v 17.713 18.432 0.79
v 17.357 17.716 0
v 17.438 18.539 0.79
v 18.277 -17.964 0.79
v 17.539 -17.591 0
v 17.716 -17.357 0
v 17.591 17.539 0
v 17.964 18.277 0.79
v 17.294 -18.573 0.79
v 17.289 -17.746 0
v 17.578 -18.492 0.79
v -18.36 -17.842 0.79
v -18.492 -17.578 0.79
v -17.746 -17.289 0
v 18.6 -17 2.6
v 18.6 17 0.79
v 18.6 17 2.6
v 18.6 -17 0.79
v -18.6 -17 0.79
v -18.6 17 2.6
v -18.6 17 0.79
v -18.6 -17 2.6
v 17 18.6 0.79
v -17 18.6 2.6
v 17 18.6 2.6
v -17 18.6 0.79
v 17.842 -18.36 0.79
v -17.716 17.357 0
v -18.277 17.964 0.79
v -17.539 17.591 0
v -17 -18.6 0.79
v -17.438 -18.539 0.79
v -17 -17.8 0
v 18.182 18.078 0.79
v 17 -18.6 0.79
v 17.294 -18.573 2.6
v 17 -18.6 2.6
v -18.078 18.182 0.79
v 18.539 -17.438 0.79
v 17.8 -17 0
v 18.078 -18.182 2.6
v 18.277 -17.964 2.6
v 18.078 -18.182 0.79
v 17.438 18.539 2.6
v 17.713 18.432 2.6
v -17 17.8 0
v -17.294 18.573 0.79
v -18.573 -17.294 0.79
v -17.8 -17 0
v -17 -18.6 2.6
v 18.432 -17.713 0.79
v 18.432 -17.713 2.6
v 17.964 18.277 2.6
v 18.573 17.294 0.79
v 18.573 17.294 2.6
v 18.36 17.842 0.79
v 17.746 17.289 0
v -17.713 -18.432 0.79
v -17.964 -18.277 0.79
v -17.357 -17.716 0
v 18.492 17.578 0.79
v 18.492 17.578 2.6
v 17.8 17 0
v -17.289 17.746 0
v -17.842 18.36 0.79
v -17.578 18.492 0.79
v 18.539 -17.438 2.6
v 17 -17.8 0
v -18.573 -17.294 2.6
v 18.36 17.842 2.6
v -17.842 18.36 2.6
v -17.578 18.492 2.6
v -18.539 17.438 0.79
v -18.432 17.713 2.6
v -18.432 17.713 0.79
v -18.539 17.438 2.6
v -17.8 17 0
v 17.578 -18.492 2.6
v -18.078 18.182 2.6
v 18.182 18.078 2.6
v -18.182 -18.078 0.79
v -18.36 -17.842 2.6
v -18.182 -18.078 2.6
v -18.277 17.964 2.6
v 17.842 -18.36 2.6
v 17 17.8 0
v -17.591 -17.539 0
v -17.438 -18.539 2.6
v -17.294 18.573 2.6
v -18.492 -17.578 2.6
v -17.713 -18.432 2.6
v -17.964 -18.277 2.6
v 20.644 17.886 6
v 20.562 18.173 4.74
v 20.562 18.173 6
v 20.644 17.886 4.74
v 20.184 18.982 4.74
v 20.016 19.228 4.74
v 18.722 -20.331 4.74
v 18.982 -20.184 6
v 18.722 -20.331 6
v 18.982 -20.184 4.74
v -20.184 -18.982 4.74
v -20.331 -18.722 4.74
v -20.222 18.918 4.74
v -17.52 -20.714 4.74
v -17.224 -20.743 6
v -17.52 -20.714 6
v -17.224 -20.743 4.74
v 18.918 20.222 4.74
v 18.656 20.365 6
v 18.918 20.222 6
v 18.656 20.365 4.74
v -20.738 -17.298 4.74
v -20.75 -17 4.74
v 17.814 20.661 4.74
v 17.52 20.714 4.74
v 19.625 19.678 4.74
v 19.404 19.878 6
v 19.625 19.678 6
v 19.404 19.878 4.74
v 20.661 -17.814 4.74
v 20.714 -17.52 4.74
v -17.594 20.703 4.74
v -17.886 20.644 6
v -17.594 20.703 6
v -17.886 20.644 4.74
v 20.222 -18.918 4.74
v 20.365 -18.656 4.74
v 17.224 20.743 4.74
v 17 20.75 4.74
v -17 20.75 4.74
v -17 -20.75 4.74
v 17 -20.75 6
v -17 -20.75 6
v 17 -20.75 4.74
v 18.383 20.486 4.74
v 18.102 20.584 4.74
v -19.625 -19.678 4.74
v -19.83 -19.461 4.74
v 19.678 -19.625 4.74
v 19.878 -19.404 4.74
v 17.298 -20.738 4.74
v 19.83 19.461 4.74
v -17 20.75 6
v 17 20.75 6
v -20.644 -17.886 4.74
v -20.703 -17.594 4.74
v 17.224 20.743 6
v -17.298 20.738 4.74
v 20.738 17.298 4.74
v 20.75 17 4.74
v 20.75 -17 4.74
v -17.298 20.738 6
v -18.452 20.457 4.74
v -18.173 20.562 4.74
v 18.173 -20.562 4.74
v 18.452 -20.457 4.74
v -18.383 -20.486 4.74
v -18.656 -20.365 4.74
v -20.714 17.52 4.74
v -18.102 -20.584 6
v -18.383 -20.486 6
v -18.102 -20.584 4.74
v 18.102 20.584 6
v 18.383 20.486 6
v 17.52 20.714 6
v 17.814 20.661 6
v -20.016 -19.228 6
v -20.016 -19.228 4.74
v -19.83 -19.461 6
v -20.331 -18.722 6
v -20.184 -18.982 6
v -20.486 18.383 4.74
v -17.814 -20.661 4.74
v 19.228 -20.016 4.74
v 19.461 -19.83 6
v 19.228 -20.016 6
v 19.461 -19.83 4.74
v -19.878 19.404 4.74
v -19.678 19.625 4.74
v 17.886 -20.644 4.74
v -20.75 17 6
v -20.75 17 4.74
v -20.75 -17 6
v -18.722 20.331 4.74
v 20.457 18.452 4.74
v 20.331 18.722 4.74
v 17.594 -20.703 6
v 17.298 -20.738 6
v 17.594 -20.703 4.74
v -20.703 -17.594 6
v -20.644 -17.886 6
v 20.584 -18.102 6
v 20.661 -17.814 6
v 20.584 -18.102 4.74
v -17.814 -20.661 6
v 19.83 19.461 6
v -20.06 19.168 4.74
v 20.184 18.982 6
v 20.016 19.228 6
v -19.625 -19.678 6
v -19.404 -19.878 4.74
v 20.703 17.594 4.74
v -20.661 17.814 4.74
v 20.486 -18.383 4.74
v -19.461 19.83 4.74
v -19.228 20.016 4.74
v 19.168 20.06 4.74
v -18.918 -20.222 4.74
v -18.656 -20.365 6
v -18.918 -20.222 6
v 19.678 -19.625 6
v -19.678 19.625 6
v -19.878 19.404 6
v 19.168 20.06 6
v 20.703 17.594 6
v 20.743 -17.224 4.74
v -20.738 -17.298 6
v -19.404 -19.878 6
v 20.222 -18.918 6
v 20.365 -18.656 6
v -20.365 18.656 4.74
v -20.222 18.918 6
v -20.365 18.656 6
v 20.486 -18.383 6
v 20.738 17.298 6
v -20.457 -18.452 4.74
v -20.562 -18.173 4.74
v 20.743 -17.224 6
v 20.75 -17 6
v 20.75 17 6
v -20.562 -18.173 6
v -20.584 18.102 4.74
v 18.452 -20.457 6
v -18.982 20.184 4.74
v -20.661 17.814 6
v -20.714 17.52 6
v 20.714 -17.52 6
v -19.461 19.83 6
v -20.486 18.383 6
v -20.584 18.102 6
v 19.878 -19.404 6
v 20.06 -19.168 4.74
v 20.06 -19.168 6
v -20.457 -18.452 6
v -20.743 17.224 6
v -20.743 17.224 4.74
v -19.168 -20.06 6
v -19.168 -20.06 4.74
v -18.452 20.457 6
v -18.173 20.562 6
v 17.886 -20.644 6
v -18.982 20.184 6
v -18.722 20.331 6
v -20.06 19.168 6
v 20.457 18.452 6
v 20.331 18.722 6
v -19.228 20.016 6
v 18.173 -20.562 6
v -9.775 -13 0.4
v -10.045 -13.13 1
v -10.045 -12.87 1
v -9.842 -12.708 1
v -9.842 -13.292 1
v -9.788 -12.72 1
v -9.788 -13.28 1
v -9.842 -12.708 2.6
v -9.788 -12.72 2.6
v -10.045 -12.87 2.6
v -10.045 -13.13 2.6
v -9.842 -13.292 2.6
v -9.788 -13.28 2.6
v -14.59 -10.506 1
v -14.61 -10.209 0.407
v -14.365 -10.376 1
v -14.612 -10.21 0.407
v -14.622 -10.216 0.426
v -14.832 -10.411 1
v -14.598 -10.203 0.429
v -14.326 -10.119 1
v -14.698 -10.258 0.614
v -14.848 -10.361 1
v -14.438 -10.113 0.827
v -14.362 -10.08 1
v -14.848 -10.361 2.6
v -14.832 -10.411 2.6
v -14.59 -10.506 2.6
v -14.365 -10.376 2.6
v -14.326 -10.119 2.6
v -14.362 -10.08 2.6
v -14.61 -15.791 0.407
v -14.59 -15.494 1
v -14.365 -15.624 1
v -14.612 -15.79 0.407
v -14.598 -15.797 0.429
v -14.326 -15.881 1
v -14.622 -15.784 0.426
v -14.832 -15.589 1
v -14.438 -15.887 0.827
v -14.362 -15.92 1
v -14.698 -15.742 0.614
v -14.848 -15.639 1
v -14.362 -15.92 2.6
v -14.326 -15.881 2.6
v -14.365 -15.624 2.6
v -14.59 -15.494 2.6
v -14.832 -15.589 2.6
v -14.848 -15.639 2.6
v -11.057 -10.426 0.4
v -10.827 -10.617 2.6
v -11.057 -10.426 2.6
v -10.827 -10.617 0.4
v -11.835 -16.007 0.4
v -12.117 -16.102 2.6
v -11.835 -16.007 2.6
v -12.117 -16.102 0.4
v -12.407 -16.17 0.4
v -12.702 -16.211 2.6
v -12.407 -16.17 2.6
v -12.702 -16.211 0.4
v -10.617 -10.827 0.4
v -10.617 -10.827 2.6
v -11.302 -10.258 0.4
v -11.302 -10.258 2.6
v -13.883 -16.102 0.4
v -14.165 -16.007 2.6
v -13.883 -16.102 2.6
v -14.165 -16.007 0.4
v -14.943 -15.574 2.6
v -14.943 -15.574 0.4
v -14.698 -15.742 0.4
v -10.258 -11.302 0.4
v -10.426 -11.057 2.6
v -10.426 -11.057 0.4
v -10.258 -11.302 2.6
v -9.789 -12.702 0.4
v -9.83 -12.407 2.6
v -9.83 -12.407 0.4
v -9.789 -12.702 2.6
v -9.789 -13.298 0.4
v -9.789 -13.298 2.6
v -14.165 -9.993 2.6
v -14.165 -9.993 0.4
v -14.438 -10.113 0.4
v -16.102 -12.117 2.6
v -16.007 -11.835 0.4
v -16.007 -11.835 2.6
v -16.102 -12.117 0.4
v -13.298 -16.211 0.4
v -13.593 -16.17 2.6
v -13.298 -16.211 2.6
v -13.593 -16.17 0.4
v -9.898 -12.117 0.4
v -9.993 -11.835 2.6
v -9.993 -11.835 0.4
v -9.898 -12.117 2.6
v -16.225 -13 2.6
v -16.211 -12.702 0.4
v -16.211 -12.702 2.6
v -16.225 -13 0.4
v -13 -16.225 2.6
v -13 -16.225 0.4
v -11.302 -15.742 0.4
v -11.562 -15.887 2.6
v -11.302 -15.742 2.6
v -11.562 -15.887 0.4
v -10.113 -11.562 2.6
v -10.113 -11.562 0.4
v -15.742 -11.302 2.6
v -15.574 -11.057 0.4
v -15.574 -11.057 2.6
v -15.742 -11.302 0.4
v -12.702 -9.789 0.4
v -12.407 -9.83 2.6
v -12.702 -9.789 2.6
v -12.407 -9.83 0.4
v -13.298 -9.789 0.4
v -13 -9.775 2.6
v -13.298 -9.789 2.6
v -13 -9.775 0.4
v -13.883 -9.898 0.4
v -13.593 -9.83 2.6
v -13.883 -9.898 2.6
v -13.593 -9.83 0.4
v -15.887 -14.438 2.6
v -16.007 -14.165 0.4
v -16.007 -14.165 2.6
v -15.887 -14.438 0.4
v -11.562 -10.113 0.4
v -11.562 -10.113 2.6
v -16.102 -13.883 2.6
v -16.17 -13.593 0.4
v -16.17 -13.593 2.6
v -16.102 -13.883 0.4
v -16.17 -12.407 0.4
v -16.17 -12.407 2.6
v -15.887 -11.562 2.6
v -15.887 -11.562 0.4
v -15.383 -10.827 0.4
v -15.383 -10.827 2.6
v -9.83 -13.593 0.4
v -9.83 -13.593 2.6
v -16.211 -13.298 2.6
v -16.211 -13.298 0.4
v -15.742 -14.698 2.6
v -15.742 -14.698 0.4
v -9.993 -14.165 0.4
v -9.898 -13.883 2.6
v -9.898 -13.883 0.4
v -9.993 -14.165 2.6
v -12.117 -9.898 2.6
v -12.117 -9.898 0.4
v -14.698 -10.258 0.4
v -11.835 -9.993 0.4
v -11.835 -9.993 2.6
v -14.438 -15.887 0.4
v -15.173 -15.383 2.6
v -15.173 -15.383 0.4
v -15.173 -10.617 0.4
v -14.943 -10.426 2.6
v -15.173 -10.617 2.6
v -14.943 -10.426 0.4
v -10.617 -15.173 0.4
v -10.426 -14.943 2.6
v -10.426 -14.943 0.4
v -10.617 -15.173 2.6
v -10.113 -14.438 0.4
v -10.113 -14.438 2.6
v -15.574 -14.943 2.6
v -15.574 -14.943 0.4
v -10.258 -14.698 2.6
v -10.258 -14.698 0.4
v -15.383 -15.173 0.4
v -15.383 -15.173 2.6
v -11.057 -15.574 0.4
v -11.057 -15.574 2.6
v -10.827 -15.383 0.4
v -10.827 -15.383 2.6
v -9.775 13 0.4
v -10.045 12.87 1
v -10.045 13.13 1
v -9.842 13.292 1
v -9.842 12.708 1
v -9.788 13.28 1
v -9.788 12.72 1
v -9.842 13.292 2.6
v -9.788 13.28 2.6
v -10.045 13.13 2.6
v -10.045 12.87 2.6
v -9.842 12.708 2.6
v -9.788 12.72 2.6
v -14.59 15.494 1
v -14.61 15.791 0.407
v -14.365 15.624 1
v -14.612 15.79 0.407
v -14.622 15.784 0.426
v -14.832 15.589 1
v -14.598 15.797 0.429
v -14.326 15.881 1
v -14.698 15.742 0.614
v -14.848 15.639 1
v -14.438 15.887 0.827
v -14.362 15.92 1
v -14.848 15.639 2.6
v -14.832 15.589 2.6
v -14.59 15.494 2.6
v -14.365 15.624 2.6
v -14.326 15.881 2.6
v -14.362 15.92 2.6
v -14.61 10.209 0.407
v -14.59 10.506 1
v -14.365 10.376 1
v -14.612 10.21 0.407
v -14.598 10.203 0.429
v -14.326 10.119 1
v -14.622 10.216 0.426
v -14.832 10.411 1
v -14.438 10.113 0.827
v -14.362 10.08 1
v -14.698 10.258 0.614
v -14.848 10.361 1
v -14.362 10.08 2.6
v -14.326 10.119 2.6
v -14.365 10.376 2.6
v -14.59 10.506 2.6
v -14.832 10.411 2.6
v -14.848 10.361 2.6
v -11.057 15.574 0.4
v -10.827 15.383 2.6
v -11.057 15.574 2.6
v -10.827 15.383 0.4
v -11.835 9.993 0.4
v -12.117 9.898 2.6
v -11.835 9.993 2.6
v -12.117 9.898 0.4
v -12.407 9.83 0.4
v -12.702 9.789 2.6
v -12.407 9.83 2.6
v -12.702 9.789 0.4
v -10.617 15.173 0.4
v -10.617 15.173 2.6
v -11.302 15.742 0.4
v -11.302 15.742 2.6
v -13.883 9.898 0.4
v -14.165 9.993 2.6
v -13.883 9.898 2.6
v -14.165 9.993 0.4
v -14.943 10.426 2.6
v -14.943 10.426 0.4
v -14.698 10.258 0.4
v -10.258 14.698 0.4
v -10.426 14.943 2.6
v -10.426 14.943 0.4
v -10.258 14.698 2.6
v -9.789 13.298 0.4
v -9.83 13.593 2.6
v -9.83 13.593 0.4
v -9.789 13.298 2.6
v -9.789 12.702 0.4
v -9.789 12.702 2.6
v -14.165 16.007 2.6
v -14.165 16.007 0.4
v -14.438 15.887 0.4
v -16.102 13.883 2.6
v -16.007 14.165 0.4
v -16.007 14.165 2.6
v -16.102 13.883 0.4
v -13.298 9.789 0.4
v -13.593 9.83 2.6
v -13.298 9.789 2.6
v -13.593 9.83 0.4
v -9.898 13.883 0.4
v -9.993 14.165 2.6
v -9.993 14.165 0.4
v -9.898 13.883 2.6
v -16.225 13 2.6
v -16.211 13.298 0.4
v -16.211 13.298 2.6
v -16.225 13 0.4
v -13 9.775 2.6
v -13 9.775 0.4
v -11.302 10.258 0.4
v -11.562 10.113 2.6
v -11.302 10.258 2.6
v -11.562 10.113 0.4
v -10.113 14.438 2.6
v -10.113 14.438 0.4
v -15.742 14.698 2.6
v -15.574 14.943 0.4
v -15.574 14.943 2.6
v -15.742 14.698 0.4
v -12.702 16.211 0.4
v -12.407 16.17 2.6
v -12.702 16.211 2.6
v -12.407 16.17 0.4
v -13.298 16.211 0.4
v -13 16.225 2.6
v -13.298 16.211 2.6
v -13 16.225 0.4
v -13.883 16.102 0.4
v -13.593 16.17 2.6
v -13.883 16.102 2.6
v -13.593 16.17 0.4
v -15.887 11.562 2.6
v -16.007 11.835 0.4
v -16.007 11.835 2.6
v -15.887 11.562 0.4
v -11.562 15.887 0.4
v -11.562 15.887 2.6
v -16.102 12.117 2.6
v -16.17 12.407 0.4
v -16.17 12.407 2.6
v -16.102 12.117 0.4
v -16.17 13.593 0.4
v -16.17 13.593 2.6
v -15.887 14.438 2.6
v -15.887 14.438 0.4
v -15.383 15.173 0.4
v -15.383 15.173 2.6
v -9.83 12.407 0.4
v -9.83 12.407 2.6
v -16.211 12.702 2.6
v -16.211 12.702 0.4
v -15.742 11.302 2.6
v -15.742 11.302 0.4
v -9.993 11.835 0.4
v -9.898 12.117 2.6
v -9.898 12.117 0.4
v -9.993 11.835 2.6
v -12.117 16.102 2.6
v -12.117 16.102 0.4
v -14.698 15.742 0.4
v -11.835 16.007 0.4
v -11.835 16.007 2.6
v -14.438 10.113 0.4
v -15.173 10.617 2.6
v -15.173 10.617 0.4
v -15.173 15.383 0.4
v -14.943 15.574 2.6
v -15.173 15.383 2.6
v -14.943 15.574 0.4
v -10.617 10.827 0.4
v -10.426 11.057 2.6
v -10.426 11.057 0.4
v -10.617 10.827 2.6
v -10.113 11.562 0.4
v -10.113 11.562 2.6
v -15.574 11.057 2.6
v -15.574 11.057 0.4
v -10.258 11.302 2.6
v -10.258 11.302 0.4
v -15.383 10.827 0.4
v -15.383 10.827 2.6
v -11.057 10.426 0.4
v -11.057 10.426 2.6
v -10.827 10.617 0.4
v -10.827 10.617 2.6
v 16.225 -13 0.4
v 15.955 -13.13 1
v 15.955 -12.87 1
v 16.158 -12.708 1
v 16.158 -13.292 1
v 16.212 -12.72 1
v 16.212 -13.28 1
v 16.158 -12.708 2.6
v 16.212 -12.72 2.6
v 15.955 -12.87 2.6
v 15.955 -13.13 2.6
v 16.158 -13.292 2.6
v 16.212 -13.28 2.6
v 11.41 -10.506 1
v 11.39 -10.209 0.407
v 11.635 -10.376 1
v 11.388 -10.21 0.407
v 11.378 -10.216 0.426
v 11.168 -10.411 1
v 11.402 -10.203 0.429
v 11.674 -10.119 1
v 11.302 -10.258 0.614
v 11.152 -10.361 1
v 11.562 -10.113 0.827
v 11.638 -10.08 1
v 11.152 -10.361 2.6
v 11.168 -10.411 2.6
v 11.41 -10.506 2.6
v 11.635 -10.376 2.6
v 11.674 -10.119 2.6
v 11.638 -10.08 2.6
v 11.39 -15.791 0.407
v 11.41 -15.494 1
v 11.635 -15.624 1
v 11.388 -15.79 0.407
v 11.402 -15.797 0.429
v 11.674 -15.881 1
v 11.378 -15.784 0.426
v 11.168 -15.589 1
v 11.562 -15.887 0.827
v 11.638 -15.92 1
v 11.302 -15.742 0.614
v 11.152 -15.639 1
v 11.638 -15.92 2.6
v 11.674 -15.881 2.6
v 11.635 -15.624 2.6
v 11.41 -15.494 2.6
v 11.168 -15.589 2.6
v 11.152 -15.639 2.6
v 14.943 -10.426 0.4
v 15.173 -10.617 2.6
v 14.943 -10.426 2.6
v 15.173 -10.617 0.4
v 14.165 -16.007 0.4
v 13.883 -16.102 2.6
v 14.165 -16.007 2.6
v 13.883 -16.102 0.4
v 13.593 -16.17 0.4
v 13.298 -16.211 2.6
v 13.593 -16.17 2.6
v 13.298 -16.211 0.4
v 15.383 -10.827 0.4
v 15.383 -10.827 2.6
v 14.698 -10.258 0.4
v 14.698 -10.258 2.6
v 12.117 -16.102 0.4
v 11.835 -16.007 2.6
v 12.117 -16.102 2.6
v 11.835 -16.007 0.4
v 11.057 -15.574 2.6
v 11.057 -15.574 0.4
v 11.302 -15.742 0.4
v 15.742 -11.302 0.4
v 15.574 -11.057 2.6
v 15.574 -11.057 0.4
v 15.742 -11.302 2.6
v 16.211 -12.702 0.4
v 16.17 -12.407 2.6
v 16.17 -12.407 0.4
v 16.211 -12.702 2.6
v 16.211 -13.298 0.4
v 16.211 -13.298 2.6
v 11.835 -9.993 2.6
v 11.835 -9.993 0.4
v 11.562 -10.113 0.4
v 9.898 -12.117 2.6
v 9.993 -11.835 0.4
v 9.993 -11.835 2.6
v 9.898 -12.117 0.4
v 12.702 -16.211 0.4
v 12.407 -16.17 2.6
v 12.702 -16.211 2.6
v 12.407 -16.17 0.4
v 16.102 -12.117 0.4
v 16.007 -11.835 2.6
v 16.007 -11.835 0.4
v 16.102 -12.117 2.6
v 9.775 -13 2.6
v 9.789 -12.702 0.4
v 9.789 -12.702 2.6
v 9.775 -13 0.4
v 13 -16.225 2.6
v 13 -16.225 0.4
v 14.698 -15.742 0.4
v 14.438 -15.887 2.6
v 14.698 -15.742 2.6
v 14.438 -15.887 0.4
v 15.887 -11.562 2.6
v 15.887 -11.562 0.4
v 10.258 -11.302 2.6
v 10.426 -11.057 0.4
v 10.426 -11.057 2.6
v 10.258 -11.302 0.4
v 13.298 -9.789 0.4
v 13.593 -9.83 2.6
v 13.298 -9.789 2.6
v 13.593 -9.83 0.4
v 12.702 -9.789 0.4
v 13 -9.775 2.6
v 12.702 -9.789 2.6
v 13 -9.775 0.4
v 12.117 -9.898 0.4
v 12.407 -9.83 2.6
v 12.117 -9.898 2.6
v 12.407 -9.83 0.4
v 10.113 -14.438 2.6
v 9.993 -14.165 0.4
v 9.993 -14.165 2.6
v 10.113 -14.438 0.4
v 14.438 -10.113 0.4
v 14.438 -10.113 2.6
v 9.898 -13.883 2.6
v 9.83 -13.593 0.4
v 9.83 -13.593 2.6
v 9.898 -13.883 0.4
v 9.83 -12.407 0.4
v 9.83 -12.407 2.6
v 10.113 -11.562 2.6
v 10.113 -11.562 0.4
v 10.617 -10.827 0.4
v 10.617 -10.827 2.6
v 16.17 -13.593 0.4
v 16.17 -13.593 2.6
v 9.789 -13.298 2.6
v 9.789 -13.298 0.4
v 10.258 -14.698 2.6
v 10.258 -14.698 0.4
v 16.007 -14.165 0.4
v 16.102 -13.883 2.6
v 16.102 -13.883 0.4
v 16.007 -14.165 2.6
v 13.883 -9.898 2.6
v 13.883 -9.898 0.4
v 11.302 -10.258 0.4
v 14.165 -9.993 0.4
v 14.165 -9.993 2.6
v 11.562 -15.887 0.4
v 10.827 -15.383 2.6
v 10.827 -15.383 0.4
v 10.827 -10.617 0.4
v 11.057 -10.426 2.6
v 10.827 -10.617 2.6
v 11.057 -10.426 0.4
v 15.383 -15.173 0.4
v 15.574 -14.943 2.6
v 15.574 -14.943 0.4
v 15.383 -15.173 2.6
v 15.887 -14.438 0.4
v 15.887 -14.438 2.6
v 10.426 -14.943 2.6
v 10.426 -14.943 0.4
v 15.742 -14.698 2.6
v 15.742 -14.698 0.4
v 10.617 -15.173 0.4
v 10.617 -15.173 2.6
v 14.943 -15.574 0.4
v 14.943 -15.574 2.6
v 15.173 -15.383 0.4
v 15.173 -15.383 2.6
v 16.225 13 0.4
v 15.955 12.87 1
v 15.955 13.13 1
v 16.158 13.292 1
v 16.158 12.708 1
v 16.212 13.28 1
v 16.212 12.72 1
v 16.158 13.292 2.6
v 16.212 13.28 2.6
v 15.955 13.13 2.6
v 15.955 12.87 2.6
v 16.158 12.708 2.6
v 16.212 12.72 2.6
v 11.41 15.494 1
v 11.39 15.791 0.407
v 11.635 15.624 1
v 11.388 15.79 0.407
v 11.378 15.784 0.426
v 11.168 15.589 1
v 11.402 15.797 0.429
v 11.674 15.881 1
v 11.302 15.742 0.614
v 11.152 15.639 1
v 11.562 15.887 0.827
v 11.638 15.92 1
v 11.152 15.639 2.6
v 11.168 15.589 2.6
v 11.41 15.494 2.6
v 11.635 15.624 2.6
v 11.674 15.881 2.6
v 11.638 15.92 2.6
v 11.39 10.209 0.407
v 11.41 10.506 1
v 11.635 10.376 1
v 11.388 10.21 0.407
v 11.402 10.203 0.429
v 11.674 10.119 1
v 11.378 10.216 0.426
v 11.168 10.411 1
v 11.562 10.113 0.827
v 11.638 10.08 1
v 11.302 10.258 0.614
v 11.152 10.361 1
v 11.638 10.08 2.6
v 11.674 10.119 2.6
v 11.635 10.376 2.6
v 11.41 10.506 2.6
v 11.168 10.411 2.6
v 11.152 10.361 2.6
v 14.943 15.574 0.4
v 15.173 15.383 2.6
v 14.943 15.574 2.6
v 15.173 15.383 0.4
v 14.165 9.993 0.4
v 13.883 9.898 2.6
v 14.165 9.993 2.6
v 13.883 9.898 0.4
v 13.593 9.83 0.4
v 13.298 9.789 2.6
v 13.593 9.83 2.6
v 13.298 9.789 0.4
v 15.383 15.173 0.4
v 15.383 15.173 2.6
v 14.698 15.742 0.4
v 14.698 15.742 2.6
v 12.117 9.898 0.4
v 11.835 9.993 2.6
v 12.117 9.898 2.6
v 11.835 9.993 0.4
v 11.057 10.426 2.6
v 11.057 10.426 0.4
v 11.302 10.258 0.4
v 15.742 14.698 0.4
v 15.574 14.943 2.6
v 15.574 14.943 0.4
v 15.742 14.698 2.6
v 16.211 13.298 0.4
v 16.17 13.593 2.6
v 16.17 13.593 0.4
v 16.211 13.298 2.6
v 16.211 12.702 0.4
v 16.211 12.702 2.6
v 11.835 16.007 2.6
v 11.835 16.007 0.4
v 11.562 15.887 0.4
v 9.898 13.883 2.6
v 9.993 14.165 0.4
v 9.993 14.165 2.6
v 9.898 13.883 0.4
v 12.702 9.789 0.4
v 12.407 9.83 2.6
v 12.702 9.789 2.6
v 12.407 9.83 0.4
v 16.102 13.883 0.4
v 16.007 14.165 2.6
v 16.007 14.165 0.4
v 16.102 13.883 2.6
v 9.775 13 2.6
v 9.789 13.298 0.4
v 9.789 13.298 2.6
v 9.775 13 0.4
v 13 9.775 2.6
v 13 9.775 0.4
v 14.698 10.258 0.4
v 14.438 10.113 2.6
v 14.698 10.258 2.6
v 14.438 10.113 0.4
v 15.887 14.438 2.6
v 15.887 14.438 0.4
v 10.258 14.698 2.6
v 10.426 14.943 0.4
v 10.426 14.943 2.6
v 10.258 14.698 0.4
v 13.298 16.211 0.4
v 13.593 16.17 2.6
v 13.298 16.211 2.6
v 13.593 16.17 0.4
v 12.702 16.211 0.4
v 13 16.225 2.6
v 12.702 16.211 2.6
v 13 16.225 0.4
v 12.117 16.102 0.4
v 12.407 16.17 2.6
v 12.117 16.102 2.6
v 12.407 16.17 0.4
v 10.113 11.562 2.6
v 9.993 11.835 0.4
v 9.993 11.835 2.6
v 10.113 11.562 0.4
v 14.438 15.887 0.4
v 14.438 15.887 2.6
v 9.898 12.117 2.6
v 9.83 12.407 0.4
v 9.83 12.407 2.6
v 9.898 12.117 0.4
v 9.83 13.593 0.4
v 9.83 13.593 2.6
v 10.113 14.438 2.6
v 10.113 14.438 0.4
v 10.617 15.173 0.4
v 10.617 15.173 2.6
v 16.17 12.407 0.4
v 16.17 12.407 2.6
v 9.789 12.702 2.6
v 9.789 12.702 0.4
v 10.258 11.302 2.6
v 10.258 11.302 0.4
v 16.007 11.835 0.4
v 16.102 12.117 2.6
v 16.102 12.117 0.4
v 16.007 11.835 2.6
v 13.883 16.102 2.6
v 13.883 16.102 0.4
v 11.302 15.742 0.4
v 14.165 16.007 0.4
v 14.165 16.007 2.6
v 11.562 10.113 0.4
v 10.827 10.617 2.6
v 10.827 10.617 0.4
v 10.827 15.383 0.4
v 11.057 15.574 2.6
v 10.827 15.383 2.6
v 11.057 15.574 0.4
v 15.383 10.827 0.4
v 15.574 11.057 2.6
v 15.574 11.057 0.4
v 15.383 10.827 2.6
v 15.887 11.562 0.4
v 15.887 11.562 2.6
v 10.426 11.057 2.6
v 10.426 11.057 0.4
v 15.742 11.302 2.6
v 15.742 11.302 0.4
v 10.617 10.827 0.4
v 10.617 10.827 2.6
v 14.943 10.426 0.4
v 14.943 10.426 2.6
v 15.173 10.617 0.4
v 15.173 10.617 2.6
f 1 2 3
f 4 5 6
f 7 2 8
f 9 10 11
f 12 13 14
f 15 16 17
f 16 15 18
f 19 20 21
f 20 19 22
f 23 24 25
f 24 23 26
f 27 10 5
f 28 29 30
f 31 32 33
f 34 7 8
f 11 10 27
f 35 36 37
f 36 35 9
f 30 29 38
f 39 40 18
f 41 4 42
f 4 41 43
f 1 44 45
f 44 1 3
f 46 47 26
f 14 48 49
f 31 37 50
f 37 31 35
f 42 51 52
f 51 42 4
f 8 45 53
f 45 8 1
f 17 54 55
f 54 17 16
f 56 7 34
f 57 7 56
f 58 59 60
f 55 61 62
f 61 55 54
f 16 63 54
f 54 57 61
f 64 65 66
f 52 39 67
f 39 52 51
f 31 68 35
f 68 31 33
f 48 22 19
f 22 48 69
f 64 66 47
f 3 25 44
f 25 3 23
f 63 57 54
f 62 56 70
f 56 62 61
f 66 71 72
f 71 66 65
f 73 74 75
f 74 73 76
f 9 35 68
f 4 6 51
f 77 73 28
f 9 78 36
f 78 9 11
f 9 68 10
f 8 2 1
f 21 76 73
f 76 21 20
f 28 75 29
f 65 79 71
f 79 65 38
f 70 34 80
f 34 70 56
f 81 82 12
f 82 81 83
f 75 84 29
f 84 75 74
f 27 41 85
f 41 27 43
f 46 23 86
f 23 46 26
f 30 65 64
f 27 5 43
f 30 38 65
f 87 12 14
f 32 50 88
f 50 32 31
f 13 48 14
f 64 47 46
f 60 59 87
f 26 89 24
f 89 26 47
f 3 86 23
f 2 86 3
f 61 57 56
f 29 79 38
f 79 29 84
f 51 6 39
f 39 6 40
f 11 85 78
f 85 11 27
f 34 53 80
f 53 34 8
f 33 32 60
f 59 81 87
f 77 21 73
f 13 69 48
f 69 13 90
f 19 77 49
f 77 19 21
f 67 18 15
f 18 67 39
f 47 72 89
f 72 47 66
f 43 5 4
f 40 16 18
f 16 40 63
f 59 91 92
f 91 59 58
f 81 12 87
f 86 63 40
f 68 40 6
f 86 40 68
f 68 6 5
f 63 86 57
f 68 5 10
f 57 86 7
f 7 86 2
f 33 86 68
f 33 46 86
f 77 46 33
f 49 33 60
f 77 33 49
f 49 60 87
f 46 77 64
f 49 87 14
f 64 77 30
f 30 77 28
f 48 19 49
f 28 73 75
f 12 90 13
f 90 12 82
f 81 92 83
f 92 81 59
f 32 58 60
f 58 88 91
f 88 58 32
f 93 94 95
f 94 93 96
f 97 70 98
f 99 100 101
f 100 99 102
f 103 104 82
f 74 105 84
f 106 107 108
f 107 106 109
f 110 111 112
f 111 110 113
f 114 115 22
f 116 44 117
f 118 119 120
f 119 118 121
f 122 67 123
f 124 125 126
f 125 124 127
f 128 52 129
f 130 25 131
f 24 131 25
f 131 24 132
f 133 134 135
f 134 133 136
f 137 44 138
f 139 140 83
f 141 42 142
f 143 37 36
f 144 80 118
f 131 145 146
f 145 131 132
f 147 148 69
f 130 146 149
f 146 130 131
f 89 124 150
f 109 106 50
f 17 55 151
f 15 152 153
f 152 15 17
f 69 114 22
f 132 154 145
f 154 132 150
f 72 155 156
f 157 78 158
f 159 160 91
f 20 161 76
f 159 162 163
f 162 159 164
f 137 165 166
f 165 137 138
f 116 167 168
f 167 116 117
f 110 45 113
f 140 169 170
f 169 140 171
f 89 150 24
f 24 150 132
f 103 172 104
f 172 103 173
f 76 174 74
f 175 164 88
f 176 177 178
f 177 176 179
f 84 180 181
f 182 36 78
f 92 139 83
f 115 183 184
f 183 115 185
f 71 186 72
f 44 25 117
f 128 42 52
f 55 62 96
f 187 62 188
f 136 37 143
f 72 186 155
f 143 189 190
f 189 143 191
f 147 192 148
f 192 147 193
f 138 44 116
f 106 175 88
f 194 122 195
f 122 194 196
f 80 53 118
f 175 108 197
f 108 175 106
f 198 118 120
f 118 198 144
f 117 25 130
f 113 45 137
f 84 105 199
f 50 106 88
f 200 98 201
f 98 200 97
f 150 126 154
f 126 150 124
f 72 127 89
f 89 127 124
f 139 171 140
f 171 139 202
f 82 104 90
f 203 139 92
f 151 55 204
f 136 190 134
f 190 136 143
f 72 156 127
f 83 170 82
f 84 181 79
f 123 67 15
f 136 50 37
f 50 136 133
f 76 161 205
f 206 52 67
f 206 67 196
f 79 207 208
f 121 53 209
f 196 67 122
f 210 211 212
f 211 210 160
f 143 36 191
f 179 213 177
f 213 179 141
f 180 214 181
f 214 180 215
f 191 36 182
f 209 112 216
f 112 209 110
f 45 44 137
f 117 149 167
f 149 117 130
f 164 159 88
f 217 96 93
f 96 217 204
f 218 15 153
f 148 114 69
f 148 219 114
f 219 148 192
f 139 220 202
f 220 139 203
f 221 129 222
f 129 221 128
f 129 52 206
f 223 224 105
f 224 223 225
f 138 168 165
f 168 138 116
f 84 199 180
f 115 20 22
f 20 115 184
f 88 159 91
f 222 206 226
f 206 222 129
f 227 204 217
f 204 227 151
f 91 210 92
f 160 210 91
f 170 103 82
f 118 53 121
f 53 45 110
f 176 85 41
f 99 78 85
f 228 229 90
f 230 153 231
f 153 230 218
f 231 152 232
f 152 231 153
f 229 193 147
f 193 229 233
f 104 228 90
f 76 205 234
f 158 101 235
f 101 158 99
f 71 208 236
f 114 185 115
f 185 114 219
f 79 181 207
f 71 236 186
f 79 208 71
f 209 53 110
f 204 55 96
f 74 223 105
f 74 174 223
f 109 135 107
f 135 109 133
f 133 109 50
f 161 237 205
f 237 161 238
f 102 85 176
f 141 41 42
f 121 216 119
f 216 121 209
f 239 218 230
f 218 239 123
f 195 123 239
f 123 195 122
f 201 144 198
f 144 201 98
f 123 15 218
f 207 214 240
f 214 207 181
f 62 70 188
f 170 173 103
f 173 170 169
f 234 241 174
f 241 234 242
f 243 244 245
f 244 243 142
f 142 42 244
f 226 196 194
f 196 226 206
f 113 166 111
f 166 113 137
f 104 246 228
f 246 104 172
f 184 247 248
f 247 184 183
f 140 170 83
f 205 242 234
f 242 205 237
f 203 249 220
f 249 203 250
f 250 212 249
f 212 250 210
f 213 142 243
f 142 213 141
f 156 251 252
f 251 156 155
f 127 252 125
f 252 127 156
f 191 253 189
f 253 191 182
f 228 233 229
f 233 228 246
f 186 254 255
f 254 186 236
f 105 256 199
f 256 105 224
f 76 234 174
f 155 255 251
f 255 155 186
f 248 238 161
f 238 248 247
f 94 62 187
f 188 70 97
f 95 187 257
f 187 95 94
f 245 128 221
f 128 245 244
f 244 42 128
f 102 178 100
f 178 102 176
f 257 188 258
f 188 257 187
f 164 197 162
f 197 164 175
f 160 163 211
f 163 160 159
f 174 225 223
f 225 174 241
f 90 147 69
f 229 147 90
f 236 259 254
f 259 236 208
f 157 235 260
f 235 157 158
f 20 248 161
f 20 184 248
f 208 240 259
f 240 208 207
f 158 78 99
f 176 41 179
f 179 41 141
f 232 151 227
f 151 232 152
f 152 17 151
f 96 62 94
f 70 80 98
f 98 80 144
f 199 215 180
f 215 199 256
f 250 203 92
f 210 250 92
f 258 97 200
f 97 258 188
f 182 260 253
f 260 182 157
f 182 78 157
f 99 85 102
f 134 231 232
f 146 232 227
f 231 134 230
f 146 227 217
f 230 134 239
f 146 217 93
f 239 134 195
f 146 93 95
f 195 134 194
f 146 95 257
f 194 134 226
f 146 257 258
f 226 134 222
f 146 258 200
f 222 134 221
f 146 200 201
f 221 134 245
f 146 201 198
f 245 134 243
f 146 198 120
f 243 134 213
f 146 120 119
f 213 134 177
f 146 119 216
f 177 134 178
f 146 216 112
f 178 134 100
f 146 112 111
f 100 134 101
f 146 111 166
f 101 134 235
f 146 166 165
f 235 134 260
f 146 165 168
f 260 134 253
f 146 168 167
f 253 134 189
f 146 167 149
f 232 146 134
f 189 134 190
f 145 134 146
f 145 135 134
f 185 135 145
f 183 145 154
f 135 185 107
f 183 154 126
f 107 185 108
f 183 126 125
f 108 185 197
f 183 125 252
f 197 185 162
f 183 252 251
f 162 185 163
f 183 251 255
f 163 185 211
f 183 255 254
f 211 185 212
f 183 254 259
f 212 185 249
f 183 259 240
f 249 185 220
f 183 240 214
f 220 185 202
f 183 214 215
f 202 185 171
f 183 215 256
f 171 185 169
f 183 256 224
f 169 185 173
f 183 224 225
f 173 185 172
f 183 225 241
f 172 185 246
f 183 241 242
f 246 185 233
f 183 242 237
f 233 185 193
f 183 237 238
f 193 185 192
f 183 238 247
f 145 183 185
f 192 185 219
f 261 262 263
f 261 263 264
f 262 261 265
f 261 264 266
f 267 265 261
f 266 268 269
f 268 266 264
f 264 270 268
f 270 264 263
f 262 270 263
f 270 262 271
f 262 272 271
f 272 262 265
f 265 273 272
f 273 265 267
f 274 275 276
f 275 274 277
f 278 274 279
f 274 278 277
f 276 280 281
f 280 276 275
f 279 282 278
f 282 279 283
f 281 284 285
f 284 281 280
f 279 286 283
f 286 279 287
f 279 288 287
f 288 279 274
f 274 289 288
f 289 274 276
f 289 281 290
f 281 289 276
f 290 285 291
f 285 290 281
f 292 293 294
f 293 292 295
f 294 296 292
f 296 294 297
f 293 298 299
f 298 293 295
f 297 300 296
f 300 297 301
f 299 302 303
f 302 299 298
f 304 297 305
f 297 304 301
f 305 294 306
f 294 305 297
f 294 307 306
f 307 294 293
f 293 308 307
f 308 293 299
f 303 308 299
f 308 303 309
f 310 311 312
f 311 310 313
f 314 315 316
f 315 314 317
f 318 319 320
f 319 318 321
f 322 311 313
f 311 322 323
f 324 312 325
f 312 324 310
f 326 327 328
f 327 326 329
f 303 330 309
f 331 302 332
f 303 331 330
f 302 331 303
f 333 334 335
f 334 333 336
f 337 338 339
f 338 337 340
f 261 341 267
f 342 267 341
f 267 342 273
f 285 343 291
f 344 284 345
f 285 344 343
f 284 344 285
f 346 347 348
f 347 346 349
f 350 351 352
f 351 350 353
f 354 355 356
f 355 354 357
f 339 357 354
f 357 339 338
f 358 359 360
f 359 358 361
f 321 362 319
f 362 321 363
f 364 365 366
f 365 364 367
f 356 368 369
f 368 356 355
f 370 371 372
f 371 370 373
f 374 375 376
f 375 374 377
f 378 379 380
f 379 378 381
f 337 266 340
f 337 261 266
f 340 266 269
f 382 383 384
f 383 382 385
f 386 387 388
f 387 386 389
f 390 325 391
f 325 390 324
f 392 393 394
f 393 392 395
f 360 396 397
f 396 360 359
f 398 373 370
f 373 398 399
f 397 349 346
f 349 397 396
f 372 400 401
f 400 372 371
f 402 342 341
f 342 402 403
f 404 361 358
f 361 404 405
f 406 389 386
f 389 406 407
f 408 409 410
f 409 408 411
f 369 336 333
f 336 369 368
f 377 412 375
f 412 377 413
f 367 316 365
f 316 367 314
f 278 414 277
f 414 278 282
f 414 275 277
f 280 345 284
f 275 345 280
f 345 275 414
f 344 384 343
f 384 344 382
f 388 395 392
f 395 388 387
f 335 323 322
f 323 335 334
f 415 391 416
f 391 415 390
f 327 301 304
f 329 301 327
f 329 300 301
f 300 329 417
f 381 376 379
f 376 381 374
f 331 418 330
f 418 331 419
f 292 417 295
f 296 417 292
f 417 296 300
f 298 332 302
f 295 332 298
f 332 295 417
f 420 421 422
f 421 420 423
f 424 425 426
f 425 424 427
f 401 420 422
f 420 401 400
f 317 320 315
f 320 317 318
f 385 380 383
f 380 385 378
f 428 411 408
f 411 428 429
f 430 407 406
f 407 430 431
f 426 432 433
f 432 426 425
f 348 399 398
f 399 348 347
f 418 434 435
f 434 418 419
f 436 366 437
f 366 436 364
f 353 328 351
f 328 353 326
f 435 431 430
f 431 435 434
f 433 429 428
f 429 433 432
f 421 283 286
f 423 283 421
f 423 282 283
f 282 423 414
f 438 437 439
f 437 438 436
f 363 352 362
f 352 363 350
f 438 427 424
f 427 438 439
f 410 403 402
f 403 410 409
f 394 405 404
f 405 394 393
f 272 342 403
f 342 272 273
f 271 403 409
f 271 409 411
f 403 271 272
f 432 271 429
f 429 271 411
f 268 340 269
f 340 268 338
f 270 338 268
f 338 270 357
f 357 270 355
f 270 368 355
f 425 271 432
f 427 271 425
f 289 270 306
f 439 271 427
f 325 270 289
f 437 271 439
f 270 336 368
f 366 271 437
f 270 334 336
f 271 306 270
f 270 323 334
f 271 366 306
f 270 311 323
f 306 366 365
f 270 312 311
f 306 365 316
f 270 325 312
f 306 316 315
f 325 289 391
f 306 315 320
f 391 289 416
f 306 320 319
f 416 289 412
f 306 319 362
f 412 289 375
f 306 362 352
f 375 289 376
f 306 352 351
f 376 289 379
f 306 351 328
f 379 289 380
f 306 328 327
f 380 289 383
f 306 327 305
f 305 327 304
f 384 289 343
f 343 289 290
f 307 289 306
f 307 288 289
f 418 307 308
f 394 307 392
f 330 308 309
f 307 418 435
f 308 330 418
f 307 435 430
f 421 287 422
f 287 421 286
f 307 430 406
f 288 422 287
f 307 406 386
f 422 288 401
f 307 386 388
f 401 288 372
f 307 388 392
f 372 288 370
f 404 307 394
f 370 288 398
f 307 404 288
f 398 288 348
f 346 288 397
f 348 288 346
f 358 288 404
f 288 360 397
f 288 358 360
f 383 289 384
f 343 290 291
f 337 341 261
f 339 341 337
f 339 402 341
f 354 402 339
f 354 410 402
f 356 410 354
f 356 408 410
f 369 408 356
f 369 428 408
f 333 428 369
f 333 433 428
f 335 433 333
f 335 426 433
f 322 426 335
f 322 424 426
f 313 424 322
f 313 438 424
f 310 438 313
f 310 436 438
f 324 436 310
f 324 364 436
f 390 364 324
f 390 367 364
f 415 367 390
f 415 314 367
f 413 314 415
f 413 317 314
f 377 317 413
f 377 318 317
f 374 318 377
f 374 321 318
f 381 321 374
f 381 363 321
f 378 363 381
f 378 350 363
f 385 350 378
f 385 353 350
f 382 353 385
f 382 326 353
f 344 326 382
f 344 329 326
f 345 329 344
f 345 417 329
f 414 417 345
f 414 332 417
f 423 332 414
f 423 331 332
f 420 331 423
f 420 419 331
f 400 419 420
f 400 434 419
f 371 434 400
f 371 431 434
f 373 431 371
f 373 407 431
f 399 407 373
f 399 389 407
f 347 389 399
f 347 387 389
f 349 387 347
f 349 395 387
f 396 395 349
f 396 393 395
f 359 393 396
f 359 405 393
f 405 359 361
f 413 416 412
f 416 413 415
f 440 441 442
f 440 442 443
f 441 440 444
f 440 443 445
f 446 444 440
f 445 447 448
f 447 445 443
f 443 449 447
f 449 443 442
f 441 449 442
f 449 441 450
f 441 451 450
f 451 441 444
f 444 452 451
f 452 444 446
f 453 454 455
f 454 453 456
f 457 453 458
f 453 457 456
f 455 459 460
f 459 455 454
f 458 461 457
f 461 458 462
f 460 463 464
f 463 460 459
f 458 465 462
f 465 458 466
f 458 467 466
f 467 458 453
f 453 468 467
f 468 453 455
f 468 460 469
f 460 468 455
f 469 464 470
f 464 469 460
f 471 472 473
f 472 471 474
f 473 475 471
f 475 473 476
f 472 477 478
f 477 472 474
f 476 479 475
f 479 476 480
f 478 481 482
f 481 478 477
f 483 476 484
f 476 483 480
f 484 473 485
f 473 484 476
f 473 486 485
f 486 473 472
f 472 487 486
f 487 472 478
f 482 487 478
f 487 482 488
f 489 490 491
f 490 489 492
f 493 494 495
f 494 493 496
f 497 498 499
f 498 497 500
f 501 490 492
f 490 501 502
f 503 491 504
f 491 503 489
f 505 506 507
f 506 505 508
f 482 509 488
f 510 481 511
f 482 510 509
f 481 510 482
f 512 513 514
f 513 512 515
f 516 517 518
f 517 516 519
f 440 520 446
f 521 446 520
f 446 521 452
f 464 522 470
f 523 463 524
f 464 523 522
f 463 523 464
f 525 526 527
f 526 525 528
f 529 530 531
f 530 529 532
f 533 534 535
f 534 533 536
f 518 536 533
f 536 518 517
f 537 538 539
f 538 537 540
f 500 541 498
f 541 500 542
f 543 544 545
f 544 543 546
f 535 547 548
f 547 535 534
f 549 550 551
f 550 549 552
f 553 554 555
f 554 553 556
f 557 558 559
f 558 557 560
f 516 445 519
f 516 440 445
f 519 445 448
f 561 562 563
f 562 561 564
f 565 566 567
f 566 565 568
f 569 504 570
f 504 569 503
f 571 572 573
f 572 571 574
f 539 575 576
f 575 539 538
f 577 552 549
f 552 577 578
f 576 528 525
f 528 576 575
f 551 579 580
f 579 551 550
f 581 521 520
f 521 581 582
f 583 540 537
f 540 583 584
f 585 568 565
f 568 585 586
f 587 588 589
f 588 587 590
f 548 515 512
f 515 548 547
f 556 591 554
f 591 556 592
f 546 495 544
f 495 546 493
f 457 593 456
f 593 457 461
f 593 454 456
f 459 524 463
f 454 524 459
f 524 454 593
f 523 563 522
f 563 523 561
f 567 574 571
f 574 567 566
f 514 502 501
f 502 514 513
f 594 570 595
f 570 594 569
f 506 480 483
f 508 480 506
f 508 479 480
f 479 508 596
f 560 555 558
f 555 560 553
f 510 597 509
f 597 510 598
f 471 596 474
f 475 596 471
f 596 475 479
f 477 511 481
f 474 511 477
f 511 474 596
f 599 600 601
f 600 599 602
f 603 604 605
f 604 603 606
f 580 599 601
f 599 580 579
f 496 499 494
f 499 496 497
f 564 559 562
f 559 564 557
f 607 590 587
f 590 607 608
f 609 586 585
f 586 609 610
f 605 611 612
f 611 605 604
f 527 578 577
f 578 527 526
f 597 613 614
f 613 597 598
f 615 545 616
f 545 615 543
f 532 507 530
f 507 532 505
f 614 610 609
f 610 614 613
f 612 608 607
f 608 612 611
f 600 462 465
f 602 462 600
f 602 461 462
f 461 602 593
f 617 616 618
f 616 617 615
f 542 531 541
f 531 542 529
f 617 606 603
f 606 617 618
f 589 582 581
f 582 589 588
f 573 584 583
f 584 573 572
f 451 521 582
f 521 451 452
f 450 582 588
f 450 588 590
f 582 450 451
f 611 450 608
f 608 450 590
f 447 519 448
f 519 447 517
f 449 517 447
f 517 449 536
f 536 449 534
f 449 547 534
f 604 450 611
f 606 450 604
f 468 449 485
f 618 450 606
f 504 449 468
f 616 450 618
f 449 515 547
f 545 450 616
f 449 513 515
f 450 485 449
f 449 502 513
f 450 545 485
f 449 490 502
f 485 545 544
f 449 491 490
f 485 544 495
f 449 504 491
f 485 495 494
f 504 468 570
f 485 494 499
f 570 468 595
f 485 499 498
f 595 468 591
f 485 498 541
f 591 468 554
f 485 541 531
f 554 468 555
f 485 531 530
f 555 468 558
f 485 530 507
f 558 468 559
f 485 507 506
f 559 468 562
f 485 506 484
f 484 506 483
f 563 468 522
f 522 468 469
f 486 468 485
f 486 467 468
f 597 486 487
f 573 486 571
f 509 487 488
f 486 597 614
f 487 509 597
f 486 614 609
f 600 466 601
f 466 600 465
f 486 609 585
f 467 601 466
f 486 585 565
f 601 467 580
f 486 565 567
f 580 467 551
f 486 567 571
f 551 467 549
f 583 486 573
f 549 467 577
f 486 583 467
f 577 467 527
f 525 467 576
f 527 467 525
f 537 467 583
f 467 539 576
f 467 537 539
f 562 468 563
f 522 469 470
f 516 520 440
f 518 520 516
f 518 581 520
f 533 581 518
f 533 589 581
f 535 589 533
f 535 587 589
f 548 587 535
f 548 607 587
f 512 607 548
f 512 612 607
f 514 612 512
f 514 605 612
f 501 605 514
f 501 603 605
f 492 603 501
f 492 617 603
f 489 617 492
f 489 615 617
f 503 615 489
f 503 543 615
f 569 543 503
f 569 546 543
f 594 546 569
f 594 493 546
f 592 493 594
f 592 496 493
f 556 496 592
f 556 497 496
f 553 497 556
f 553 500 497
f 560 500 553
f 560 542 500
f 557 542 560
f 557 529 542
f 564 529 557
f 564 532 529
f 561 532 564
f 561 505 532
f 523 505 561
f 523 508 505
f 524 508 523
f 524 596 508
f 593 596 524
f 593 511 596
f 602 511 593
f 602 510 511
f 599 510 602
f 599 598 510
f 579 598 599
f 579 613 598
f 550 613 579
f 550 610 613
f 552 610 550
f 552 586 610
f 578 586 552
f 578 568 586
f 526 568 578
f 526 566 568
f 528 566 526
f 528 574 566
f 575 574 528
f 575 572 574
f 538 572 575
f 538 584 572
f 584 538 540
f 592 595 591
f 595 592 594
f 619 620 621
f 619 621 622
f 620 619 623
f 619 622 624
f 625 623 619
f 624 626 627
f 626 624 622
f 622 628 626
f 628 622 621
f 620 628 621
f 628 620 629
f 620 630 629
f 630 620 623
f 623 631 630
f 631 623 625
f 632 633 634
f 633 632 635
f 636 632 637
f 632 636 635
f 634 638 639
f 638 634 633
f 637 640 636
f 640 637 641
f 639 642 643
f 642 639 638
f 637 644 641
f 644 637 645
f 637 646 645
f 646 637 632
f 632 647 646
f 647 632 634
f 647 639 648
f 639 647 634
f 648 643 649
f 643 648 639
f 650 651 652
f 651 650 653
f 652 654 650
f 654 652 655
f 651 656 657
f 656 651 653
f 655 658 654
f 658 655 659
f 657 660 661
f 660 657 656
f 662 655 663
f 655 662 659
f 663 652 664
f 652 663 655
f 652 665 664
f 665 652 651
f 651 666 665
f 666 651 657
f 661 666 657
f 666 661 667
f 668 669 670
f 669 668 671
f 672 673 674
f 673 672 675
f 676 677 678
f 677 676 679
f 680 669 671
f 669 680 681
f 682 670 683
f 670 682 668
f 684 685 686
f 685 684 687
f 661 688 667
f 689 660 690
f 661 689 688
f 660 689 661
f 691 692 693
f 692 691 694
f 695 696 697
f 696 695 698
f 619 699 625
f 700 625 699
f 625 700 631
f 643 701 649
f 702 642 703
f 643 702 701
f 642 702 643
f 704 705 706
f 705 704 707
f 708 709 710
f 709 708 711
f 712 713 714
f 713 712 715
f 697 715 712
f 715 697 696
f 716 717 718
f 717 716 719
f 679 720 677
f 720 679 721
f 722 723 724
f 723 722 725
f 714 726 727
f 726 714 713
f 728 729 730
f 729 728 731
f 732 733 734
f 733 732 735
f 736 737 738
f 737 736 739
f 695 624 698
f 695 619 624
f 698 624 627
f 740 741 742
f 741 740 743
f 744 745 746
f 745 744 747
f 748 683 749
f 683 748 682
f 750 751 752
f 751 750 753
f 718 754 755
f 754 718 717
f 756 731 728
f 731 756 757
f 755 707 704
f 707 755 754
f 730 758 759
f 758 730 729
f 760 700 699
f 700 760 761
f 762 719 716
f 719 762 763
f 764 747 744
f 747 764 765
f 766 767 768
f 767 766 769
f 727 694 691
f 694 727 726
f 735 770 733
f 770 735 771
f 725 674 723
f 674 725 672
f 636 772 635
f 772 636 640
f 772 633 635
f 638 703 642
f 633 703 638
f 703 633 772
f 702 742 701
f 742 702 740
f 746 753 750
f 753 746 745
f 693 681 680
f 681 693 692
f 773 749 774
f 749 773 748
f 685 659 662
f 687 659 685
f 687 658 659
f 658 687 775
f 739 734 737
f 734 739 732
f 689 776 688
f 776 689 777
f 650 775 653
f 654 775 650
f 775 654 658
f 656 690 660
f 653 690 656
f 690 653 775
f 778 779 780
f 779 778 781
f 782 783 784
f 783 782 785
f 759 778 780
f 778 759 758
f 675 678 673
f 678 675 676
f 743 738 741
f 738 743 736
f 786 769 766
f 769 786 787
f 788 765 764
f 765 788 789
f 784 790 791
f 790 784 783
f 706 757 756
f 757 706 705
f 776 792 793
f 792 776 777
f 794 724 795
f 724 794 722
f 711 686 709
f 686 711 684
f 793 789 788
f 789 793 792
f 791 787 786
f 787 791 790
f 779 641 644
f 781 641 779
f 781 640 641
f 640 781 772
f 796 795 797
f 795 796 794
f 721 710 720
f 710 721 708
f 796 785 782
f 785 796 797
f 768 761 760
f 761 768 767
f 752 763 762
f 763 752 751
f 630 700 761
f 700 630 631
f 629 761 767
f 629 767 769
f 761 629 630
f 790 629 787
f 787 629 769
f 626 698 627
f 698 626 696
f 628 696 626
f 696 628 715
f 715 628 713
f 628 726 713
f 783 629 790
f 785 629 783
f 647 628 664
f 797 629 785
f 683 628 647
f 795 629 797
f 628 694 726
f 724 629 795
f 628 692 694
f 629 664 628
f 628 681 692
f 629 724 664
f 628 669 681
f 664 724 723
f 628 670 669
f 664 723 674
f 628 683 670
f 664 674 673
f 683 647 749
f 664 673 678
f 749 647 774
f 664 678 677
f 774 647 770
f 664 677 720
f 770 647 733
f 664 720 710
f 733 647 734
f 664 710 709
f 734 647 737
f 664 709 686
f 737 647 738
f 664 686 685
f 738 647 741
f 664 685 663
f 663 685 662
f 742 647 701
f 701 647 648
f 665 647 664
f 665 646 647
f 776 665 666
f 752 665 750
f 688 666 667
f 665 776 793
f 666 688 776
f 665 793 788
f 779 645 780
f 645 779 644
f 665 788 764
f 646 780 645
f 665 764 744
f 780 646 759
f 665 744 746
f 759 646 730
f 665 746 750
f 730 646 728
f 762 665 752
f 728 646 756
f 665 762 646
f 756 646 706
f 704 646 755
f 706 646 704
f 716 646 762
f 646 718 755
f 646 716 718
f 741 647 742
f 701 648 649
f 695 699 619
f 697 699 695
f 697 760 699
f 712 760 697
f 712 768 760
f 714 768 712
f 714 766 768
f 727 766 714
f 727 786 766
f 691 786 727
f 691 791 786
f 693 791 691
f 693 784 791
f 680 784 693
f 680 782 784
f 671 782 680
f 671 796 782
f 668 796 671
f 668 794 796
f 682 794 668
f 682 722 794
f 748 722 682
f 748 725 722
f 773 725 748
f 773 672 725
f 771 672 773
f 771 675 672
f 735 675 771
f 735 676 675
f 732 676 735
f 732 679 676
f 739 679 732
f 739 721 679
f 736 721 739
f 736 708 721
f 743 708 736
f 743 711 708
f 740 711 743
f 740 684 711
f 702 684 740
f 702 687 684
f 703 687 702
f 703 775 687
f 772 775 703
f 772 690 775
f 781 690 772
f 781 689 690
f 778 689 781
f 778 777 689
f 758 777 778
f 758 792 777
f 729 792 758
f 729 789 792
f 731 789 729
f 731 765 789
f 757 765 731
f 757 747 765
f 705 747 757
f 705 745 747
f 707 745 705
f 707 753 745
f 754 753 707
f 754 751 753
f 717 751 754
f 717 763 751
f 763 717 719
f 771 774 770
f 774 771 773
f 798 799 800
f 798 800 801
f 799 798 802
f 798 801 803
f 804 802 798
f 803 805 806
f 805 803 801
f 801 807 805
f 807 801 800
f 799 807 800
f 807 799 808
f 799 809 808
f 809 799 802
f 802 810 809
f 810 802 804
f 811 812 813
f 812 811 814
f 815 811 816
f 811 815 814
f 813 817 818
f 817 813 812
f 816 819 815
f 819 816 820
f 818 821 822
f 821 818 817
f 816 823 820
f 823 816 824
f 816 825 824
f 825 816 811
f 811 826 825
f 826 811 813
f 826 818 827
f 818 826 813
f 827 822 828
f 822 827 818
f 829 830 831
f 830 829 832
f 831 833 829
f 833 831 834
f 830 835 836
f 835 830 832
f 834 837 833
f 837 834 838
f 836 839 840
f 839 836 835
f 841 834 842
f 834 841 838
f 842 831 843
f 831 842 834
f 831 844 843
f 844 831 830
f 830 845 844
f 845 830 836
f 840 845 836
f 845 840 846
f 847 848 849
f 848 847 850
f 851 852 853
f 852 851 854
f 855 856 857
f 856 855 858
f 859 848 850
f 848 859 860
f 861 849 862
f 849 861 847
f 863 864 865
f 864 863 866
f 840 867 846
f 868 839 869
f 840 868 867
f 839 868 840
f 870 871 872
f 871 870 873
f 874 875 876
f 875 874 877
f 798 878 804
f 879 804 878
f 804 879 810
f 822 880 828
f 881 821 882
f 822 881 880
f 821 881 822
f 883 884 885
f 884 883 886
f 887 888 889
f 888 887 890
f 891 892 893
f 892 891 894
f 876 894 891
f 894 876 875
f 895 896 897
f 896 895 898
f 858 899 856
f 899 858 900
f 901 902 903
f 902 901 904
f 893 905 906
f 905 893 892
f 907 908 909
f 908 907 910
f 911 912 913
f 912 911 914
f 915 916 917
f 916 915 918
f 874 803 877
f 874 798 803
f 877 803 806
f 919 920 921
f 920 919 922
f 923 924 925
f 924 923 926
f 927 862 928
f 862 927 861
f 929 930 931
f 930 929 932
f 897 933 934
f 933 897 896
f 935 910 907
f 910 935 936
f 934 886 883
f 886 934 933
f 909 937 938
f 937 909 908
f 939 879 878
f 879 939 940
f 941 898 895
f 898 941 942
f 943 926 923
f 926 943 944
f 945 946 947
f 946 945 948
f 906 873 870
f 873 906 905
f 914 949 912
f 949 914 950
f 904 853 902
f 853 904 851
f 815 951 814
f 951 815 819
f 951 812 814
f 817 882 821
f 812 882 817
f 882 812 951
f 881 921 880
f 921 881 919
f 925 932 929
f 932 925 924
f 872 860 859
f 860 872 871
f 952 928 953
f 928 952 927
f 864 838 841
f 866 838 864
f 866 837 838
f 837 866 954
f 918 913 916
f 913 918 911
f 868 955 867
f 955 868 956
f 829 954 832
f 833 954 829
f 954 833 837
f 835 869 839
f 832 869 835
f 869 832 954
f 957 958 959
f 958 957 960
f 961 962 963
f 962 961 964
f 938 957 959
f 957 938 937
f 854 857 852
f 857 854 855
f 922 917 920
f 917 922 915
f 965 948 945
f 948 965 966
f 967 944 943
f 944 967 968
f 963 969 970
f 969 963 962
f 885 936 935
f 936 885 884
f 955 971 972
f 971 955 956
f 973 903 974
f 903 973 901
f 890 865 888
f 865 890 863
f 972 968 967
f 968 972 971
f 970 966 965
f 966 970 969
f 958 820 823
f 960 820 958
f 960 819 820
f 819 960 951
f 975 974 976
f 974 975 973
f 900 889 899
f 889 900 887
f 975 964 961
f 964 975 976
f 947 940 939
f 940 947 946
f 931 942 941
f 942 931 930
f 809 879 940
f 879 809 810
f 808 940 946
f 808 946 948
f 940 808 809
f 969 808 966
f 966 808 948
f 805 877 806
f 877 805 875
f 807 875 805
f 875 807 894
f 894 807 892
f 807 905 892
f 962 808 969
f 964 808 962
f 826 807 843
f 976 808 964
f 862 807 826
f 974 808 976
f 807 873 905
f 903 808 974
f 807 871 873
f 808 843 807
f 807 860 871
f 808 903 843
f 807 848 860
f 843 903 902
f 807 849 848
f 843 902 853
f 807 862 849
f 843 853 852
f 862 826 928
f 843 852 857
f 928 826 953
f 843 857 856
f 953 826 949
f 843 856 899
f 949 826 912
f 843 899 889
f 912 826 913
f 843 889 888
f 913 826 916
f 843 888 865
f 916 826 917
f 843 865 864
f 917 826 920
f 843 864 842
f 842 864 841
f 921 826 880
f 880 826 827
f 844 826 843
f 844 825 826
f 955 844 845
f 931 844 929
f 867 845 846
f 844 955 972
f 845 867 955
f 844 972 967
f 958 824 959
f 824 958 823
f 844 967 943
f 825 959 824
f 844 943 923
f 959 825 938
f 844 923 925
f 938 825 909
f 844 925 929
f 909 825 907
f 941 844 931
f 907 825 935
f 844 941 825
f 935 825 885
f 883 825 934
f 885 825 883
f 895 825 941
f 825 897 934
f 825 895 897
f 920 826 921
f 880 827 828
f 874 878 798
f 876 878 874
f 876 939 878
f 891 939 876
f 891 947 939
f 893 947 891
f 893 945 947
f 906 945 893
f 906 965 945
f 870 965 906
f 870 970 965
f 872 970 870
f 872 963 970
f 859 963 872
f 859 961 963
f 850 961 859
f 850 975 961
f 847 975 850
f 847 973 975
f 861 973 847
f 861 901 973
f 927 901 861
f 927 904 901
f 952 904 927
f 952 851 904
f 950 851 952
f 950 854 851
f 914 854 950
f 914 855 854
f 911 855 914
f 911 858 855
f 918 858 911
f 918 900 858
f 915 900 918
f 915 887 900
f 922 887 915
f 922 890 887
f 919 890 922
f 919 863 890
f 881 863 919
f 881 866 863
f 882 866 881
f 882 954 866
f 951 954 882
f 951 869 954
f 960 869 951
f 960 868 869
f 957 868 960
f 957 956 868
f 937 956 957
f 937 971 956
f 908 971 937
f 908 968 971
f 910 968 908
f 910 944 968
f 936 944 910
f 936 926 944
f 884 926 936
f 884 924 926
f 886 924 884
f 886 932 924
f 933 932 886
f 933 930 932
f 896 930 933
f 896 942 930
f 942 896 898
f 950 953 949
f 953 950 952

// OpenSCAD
// Gridfinity-compatible 1x1 letter tag.
//
// Two-material design for a dual-extruder / IDEX printer. The top face is
// perfectly flush: the `body` part contains the Gridfinity base, the letter
// (extending to the top face), and the surrounding tile up to color_layers
// below the top; the `outside` part is a thin cap that fills the top
// color_layers around the letter. The two parts mate on coplanar surfaces,
// so the slicer assigns each to a different extruder and prints them
// simultaneously — no filament swap.
//
// Print upside down (top face on the build plate). The outside cap is laid
// down first; the body continues above it. Four 6x2 mm magnets are embedded
// in standard Gridfinity corner positions; pause at z = tile_height -
// magnet_ceiling to drop them in, then resume to bridge over.
//
// Render both parts:
//   openscad -o A_body.stl    -D 'letter="A"' -D 'part="body"'    letter_tag.scad
//   openscad -o A_outside.stl -D 'letter="A"' -D 'part="outside"' letter_tag.scad
//
// Override `letter` from the command line:
//   openscad -o A.stl -D 'letter="A"' letter_tag.scad

/* [Print] */
layer_height = 0.2;    // slicer layer height; everything important is in layers
part         = "all";  // "all" (preview), "body", or "outside"

/* [Letter] */
letter       = "A";
font         = "Liberation Sans:style=Bold";
letter_size  = 28;     // cap-height target in mm
color_layers = 3;      // letter-color layers; recess depth = layer_height * this

/* [Tile] */
tile_height  = 6;      // total tile thickness, base bottom -> top face

/* [Magnets] */
add_magnets             = true;
magnet_d                = 5.85;  // inscribed dia at bump tips (reduce for tighter, increase for looser; nominal magnet is 6.0)
magnet_h                = 2.0;   // 6 x 2 mm neodymium magnet thickness
magnet_pos              = 13;    // center offset from tile center (= 8 mm from 42 mm grid edge)
magnet_cover_layers     = 2;     // layers between magnet and baseplate
magnet_clearance_layers = 1;     // extra pocket headroom above magnet (absorbs bridge sag + magnet thickness tolerance)
magnet_bumps            = 3;     // press-fit bumps inside pocket wall; localized contact tolerates FDM wall variation
magnet_bump_protrusion  = 0.3;   // each bump protrudes this far into the cavity (radial mm); cavity dia = magnet_d + 2*this
magnet_bump_chamfer     = 0.6;   // bump entry chamfer height (mm) — eases magnet insertion

/* [Gridfinity 1x1 base, official spec] */
gf_outer      = 41.5;
gf_outer_r    = 3.75;
gf_chamfer_lo = 0.8;
gf_straight   = 1.8;
gf_chamfer_hi = 2.15;
gf_base_h     = gf_chamfer_lo + gf_straight + gf_chamfer_hi;   // 4.75

// Derived
recess_depth   = layer_height * color_layers;
magnet_ceiling = layer_height * magnet_cover_layers;

$fa = 2;
$fs = 0.3;

module rounded_square(size, r) {
    offset(r=r) offset(r=-r) square(size, center=true);
}

module gf_base() {
    bottom   = gf_outer  - 2 * (gf_chamfer_lo + gf_chamfer_hi);   // 35.6
    bottom_r = gf_outer_r -      gf_chamfer_lo - gf_chamfer_hi;   // 0.8
    mid      = gf_outer  - 2 *  gf_chamfer_hi;                    // 37.2
    mid_r    = gf_outer_r -      gf_chamfer_hi;                   // 1.6

    // Lower chamfer
    hull() {
        linear_extrude(0.01) rounded_square(bottom, bottom_r);
        translate([0, 0, gf_chamfer_lo - 0.01])
            linear_extrude(0.01) rounded_square(mid, mid_r);
    }
    // Straight middle
    translate([0, 0, gf_chamfer_lo])
        linear_extrude(gf_straight) rounded_square(mid, mid_r);
    // Upper chamfer
    translate([0, 0, gf_chamfer_lo + gf_straight]) hull() {
        linear_extrude(0.01) rounded_square(mid, mid_r);
        translate([0, 0, gf_chamfer_hi - 0.01])
            linear_extrude(0.01) rounded_square(gf_outer, gf_outer_r);
    }
}

module magnet_pocket(hole_r, h, bump_r, bumps, chamfer) {
    // Cavity = big cylinder with `bumps` press-fit ribs protruding inward
    // from the wall. Bumps taper from a point at z=0 (the side the magnet
    // enters from during the print pause) to full radius over `chamfer` mm.
    difference() {
        cylinder(h = h, r = hole_r);
        for (i = [0 : bumps - 1])
            rotate([0, 0, i * 360 / bumps])
                translate([hole_r, 0, 0]) {
                    cylinder(h = chamfer, r1 = 0, r2 = bump_r);
                    translate([0, 0, chamfer])
                        cylinder(h = h - chamfer + 0.01, r = bump_r);
                }
    }
}

module magnet_pockets() {
    // Pockets are encapsulated: magnet_ceiling of solid plastic sits between
    // the magnet and the base bottom (the face touching the baseplate).
    pocket_h = magnet_h + magnet_clearance_layers * layer_height;
    hole_r   = magnet_d / 2 + magnet_bump_protrusion;
    for (sx = [-1, 1]) for (sy = [-1, 1])
        translate([sx * magnet_pos, sy * magnet_pos, magnet_ceiling])
            magnet_pocket(hole_r, pocket_h, magnet_bump_protrusion,
                          magnet_bumps, magnet_bump_chamfer);
}

module raw_tile() {
    gf_base();
    translate([0, 0, gf_base_h])
        linear_extrude(tile_height - gf_base_h)
            rounded_square(gf_outer, gf_outer_r);
}

// Top color_layers slab in the tile silhouette, with the letter cut out.
// `extra` extends the top face upward for clean boolean subtraction.
module outside_cap(extra=0) {
    translate([0, 0, tile_height - recess_depth])
        linear_extrude(recess_depth + extra)
            difference() {
                rounded_square(gf_outer, gf_outer_r);
                text(letter, size=letter_size, font=font,
                     halign="center", valign="center");
            }
}

module body() {
    difference() {
        raw_tile();
        outside_cap(extra=0.1);
        if (add_magnets) magnet_pockets();
    }
}

module outside() {
    outside_cap();
}

// Preview-only colors; ignored by STL export.
body_color    = "Crimson";
outside_color = "Black";

if (part == "all") {
    color(body_color)    body();
    color(outside_color) outside();
} else if (part == "body") {
    color(body_color) body();
} else if (part == "outside") {
    color(outside_color) outside();
} else {
    assert(false, str("Unknown part: ", part, " (expected \"all\", \"body\", or \"outside\")"));
}
